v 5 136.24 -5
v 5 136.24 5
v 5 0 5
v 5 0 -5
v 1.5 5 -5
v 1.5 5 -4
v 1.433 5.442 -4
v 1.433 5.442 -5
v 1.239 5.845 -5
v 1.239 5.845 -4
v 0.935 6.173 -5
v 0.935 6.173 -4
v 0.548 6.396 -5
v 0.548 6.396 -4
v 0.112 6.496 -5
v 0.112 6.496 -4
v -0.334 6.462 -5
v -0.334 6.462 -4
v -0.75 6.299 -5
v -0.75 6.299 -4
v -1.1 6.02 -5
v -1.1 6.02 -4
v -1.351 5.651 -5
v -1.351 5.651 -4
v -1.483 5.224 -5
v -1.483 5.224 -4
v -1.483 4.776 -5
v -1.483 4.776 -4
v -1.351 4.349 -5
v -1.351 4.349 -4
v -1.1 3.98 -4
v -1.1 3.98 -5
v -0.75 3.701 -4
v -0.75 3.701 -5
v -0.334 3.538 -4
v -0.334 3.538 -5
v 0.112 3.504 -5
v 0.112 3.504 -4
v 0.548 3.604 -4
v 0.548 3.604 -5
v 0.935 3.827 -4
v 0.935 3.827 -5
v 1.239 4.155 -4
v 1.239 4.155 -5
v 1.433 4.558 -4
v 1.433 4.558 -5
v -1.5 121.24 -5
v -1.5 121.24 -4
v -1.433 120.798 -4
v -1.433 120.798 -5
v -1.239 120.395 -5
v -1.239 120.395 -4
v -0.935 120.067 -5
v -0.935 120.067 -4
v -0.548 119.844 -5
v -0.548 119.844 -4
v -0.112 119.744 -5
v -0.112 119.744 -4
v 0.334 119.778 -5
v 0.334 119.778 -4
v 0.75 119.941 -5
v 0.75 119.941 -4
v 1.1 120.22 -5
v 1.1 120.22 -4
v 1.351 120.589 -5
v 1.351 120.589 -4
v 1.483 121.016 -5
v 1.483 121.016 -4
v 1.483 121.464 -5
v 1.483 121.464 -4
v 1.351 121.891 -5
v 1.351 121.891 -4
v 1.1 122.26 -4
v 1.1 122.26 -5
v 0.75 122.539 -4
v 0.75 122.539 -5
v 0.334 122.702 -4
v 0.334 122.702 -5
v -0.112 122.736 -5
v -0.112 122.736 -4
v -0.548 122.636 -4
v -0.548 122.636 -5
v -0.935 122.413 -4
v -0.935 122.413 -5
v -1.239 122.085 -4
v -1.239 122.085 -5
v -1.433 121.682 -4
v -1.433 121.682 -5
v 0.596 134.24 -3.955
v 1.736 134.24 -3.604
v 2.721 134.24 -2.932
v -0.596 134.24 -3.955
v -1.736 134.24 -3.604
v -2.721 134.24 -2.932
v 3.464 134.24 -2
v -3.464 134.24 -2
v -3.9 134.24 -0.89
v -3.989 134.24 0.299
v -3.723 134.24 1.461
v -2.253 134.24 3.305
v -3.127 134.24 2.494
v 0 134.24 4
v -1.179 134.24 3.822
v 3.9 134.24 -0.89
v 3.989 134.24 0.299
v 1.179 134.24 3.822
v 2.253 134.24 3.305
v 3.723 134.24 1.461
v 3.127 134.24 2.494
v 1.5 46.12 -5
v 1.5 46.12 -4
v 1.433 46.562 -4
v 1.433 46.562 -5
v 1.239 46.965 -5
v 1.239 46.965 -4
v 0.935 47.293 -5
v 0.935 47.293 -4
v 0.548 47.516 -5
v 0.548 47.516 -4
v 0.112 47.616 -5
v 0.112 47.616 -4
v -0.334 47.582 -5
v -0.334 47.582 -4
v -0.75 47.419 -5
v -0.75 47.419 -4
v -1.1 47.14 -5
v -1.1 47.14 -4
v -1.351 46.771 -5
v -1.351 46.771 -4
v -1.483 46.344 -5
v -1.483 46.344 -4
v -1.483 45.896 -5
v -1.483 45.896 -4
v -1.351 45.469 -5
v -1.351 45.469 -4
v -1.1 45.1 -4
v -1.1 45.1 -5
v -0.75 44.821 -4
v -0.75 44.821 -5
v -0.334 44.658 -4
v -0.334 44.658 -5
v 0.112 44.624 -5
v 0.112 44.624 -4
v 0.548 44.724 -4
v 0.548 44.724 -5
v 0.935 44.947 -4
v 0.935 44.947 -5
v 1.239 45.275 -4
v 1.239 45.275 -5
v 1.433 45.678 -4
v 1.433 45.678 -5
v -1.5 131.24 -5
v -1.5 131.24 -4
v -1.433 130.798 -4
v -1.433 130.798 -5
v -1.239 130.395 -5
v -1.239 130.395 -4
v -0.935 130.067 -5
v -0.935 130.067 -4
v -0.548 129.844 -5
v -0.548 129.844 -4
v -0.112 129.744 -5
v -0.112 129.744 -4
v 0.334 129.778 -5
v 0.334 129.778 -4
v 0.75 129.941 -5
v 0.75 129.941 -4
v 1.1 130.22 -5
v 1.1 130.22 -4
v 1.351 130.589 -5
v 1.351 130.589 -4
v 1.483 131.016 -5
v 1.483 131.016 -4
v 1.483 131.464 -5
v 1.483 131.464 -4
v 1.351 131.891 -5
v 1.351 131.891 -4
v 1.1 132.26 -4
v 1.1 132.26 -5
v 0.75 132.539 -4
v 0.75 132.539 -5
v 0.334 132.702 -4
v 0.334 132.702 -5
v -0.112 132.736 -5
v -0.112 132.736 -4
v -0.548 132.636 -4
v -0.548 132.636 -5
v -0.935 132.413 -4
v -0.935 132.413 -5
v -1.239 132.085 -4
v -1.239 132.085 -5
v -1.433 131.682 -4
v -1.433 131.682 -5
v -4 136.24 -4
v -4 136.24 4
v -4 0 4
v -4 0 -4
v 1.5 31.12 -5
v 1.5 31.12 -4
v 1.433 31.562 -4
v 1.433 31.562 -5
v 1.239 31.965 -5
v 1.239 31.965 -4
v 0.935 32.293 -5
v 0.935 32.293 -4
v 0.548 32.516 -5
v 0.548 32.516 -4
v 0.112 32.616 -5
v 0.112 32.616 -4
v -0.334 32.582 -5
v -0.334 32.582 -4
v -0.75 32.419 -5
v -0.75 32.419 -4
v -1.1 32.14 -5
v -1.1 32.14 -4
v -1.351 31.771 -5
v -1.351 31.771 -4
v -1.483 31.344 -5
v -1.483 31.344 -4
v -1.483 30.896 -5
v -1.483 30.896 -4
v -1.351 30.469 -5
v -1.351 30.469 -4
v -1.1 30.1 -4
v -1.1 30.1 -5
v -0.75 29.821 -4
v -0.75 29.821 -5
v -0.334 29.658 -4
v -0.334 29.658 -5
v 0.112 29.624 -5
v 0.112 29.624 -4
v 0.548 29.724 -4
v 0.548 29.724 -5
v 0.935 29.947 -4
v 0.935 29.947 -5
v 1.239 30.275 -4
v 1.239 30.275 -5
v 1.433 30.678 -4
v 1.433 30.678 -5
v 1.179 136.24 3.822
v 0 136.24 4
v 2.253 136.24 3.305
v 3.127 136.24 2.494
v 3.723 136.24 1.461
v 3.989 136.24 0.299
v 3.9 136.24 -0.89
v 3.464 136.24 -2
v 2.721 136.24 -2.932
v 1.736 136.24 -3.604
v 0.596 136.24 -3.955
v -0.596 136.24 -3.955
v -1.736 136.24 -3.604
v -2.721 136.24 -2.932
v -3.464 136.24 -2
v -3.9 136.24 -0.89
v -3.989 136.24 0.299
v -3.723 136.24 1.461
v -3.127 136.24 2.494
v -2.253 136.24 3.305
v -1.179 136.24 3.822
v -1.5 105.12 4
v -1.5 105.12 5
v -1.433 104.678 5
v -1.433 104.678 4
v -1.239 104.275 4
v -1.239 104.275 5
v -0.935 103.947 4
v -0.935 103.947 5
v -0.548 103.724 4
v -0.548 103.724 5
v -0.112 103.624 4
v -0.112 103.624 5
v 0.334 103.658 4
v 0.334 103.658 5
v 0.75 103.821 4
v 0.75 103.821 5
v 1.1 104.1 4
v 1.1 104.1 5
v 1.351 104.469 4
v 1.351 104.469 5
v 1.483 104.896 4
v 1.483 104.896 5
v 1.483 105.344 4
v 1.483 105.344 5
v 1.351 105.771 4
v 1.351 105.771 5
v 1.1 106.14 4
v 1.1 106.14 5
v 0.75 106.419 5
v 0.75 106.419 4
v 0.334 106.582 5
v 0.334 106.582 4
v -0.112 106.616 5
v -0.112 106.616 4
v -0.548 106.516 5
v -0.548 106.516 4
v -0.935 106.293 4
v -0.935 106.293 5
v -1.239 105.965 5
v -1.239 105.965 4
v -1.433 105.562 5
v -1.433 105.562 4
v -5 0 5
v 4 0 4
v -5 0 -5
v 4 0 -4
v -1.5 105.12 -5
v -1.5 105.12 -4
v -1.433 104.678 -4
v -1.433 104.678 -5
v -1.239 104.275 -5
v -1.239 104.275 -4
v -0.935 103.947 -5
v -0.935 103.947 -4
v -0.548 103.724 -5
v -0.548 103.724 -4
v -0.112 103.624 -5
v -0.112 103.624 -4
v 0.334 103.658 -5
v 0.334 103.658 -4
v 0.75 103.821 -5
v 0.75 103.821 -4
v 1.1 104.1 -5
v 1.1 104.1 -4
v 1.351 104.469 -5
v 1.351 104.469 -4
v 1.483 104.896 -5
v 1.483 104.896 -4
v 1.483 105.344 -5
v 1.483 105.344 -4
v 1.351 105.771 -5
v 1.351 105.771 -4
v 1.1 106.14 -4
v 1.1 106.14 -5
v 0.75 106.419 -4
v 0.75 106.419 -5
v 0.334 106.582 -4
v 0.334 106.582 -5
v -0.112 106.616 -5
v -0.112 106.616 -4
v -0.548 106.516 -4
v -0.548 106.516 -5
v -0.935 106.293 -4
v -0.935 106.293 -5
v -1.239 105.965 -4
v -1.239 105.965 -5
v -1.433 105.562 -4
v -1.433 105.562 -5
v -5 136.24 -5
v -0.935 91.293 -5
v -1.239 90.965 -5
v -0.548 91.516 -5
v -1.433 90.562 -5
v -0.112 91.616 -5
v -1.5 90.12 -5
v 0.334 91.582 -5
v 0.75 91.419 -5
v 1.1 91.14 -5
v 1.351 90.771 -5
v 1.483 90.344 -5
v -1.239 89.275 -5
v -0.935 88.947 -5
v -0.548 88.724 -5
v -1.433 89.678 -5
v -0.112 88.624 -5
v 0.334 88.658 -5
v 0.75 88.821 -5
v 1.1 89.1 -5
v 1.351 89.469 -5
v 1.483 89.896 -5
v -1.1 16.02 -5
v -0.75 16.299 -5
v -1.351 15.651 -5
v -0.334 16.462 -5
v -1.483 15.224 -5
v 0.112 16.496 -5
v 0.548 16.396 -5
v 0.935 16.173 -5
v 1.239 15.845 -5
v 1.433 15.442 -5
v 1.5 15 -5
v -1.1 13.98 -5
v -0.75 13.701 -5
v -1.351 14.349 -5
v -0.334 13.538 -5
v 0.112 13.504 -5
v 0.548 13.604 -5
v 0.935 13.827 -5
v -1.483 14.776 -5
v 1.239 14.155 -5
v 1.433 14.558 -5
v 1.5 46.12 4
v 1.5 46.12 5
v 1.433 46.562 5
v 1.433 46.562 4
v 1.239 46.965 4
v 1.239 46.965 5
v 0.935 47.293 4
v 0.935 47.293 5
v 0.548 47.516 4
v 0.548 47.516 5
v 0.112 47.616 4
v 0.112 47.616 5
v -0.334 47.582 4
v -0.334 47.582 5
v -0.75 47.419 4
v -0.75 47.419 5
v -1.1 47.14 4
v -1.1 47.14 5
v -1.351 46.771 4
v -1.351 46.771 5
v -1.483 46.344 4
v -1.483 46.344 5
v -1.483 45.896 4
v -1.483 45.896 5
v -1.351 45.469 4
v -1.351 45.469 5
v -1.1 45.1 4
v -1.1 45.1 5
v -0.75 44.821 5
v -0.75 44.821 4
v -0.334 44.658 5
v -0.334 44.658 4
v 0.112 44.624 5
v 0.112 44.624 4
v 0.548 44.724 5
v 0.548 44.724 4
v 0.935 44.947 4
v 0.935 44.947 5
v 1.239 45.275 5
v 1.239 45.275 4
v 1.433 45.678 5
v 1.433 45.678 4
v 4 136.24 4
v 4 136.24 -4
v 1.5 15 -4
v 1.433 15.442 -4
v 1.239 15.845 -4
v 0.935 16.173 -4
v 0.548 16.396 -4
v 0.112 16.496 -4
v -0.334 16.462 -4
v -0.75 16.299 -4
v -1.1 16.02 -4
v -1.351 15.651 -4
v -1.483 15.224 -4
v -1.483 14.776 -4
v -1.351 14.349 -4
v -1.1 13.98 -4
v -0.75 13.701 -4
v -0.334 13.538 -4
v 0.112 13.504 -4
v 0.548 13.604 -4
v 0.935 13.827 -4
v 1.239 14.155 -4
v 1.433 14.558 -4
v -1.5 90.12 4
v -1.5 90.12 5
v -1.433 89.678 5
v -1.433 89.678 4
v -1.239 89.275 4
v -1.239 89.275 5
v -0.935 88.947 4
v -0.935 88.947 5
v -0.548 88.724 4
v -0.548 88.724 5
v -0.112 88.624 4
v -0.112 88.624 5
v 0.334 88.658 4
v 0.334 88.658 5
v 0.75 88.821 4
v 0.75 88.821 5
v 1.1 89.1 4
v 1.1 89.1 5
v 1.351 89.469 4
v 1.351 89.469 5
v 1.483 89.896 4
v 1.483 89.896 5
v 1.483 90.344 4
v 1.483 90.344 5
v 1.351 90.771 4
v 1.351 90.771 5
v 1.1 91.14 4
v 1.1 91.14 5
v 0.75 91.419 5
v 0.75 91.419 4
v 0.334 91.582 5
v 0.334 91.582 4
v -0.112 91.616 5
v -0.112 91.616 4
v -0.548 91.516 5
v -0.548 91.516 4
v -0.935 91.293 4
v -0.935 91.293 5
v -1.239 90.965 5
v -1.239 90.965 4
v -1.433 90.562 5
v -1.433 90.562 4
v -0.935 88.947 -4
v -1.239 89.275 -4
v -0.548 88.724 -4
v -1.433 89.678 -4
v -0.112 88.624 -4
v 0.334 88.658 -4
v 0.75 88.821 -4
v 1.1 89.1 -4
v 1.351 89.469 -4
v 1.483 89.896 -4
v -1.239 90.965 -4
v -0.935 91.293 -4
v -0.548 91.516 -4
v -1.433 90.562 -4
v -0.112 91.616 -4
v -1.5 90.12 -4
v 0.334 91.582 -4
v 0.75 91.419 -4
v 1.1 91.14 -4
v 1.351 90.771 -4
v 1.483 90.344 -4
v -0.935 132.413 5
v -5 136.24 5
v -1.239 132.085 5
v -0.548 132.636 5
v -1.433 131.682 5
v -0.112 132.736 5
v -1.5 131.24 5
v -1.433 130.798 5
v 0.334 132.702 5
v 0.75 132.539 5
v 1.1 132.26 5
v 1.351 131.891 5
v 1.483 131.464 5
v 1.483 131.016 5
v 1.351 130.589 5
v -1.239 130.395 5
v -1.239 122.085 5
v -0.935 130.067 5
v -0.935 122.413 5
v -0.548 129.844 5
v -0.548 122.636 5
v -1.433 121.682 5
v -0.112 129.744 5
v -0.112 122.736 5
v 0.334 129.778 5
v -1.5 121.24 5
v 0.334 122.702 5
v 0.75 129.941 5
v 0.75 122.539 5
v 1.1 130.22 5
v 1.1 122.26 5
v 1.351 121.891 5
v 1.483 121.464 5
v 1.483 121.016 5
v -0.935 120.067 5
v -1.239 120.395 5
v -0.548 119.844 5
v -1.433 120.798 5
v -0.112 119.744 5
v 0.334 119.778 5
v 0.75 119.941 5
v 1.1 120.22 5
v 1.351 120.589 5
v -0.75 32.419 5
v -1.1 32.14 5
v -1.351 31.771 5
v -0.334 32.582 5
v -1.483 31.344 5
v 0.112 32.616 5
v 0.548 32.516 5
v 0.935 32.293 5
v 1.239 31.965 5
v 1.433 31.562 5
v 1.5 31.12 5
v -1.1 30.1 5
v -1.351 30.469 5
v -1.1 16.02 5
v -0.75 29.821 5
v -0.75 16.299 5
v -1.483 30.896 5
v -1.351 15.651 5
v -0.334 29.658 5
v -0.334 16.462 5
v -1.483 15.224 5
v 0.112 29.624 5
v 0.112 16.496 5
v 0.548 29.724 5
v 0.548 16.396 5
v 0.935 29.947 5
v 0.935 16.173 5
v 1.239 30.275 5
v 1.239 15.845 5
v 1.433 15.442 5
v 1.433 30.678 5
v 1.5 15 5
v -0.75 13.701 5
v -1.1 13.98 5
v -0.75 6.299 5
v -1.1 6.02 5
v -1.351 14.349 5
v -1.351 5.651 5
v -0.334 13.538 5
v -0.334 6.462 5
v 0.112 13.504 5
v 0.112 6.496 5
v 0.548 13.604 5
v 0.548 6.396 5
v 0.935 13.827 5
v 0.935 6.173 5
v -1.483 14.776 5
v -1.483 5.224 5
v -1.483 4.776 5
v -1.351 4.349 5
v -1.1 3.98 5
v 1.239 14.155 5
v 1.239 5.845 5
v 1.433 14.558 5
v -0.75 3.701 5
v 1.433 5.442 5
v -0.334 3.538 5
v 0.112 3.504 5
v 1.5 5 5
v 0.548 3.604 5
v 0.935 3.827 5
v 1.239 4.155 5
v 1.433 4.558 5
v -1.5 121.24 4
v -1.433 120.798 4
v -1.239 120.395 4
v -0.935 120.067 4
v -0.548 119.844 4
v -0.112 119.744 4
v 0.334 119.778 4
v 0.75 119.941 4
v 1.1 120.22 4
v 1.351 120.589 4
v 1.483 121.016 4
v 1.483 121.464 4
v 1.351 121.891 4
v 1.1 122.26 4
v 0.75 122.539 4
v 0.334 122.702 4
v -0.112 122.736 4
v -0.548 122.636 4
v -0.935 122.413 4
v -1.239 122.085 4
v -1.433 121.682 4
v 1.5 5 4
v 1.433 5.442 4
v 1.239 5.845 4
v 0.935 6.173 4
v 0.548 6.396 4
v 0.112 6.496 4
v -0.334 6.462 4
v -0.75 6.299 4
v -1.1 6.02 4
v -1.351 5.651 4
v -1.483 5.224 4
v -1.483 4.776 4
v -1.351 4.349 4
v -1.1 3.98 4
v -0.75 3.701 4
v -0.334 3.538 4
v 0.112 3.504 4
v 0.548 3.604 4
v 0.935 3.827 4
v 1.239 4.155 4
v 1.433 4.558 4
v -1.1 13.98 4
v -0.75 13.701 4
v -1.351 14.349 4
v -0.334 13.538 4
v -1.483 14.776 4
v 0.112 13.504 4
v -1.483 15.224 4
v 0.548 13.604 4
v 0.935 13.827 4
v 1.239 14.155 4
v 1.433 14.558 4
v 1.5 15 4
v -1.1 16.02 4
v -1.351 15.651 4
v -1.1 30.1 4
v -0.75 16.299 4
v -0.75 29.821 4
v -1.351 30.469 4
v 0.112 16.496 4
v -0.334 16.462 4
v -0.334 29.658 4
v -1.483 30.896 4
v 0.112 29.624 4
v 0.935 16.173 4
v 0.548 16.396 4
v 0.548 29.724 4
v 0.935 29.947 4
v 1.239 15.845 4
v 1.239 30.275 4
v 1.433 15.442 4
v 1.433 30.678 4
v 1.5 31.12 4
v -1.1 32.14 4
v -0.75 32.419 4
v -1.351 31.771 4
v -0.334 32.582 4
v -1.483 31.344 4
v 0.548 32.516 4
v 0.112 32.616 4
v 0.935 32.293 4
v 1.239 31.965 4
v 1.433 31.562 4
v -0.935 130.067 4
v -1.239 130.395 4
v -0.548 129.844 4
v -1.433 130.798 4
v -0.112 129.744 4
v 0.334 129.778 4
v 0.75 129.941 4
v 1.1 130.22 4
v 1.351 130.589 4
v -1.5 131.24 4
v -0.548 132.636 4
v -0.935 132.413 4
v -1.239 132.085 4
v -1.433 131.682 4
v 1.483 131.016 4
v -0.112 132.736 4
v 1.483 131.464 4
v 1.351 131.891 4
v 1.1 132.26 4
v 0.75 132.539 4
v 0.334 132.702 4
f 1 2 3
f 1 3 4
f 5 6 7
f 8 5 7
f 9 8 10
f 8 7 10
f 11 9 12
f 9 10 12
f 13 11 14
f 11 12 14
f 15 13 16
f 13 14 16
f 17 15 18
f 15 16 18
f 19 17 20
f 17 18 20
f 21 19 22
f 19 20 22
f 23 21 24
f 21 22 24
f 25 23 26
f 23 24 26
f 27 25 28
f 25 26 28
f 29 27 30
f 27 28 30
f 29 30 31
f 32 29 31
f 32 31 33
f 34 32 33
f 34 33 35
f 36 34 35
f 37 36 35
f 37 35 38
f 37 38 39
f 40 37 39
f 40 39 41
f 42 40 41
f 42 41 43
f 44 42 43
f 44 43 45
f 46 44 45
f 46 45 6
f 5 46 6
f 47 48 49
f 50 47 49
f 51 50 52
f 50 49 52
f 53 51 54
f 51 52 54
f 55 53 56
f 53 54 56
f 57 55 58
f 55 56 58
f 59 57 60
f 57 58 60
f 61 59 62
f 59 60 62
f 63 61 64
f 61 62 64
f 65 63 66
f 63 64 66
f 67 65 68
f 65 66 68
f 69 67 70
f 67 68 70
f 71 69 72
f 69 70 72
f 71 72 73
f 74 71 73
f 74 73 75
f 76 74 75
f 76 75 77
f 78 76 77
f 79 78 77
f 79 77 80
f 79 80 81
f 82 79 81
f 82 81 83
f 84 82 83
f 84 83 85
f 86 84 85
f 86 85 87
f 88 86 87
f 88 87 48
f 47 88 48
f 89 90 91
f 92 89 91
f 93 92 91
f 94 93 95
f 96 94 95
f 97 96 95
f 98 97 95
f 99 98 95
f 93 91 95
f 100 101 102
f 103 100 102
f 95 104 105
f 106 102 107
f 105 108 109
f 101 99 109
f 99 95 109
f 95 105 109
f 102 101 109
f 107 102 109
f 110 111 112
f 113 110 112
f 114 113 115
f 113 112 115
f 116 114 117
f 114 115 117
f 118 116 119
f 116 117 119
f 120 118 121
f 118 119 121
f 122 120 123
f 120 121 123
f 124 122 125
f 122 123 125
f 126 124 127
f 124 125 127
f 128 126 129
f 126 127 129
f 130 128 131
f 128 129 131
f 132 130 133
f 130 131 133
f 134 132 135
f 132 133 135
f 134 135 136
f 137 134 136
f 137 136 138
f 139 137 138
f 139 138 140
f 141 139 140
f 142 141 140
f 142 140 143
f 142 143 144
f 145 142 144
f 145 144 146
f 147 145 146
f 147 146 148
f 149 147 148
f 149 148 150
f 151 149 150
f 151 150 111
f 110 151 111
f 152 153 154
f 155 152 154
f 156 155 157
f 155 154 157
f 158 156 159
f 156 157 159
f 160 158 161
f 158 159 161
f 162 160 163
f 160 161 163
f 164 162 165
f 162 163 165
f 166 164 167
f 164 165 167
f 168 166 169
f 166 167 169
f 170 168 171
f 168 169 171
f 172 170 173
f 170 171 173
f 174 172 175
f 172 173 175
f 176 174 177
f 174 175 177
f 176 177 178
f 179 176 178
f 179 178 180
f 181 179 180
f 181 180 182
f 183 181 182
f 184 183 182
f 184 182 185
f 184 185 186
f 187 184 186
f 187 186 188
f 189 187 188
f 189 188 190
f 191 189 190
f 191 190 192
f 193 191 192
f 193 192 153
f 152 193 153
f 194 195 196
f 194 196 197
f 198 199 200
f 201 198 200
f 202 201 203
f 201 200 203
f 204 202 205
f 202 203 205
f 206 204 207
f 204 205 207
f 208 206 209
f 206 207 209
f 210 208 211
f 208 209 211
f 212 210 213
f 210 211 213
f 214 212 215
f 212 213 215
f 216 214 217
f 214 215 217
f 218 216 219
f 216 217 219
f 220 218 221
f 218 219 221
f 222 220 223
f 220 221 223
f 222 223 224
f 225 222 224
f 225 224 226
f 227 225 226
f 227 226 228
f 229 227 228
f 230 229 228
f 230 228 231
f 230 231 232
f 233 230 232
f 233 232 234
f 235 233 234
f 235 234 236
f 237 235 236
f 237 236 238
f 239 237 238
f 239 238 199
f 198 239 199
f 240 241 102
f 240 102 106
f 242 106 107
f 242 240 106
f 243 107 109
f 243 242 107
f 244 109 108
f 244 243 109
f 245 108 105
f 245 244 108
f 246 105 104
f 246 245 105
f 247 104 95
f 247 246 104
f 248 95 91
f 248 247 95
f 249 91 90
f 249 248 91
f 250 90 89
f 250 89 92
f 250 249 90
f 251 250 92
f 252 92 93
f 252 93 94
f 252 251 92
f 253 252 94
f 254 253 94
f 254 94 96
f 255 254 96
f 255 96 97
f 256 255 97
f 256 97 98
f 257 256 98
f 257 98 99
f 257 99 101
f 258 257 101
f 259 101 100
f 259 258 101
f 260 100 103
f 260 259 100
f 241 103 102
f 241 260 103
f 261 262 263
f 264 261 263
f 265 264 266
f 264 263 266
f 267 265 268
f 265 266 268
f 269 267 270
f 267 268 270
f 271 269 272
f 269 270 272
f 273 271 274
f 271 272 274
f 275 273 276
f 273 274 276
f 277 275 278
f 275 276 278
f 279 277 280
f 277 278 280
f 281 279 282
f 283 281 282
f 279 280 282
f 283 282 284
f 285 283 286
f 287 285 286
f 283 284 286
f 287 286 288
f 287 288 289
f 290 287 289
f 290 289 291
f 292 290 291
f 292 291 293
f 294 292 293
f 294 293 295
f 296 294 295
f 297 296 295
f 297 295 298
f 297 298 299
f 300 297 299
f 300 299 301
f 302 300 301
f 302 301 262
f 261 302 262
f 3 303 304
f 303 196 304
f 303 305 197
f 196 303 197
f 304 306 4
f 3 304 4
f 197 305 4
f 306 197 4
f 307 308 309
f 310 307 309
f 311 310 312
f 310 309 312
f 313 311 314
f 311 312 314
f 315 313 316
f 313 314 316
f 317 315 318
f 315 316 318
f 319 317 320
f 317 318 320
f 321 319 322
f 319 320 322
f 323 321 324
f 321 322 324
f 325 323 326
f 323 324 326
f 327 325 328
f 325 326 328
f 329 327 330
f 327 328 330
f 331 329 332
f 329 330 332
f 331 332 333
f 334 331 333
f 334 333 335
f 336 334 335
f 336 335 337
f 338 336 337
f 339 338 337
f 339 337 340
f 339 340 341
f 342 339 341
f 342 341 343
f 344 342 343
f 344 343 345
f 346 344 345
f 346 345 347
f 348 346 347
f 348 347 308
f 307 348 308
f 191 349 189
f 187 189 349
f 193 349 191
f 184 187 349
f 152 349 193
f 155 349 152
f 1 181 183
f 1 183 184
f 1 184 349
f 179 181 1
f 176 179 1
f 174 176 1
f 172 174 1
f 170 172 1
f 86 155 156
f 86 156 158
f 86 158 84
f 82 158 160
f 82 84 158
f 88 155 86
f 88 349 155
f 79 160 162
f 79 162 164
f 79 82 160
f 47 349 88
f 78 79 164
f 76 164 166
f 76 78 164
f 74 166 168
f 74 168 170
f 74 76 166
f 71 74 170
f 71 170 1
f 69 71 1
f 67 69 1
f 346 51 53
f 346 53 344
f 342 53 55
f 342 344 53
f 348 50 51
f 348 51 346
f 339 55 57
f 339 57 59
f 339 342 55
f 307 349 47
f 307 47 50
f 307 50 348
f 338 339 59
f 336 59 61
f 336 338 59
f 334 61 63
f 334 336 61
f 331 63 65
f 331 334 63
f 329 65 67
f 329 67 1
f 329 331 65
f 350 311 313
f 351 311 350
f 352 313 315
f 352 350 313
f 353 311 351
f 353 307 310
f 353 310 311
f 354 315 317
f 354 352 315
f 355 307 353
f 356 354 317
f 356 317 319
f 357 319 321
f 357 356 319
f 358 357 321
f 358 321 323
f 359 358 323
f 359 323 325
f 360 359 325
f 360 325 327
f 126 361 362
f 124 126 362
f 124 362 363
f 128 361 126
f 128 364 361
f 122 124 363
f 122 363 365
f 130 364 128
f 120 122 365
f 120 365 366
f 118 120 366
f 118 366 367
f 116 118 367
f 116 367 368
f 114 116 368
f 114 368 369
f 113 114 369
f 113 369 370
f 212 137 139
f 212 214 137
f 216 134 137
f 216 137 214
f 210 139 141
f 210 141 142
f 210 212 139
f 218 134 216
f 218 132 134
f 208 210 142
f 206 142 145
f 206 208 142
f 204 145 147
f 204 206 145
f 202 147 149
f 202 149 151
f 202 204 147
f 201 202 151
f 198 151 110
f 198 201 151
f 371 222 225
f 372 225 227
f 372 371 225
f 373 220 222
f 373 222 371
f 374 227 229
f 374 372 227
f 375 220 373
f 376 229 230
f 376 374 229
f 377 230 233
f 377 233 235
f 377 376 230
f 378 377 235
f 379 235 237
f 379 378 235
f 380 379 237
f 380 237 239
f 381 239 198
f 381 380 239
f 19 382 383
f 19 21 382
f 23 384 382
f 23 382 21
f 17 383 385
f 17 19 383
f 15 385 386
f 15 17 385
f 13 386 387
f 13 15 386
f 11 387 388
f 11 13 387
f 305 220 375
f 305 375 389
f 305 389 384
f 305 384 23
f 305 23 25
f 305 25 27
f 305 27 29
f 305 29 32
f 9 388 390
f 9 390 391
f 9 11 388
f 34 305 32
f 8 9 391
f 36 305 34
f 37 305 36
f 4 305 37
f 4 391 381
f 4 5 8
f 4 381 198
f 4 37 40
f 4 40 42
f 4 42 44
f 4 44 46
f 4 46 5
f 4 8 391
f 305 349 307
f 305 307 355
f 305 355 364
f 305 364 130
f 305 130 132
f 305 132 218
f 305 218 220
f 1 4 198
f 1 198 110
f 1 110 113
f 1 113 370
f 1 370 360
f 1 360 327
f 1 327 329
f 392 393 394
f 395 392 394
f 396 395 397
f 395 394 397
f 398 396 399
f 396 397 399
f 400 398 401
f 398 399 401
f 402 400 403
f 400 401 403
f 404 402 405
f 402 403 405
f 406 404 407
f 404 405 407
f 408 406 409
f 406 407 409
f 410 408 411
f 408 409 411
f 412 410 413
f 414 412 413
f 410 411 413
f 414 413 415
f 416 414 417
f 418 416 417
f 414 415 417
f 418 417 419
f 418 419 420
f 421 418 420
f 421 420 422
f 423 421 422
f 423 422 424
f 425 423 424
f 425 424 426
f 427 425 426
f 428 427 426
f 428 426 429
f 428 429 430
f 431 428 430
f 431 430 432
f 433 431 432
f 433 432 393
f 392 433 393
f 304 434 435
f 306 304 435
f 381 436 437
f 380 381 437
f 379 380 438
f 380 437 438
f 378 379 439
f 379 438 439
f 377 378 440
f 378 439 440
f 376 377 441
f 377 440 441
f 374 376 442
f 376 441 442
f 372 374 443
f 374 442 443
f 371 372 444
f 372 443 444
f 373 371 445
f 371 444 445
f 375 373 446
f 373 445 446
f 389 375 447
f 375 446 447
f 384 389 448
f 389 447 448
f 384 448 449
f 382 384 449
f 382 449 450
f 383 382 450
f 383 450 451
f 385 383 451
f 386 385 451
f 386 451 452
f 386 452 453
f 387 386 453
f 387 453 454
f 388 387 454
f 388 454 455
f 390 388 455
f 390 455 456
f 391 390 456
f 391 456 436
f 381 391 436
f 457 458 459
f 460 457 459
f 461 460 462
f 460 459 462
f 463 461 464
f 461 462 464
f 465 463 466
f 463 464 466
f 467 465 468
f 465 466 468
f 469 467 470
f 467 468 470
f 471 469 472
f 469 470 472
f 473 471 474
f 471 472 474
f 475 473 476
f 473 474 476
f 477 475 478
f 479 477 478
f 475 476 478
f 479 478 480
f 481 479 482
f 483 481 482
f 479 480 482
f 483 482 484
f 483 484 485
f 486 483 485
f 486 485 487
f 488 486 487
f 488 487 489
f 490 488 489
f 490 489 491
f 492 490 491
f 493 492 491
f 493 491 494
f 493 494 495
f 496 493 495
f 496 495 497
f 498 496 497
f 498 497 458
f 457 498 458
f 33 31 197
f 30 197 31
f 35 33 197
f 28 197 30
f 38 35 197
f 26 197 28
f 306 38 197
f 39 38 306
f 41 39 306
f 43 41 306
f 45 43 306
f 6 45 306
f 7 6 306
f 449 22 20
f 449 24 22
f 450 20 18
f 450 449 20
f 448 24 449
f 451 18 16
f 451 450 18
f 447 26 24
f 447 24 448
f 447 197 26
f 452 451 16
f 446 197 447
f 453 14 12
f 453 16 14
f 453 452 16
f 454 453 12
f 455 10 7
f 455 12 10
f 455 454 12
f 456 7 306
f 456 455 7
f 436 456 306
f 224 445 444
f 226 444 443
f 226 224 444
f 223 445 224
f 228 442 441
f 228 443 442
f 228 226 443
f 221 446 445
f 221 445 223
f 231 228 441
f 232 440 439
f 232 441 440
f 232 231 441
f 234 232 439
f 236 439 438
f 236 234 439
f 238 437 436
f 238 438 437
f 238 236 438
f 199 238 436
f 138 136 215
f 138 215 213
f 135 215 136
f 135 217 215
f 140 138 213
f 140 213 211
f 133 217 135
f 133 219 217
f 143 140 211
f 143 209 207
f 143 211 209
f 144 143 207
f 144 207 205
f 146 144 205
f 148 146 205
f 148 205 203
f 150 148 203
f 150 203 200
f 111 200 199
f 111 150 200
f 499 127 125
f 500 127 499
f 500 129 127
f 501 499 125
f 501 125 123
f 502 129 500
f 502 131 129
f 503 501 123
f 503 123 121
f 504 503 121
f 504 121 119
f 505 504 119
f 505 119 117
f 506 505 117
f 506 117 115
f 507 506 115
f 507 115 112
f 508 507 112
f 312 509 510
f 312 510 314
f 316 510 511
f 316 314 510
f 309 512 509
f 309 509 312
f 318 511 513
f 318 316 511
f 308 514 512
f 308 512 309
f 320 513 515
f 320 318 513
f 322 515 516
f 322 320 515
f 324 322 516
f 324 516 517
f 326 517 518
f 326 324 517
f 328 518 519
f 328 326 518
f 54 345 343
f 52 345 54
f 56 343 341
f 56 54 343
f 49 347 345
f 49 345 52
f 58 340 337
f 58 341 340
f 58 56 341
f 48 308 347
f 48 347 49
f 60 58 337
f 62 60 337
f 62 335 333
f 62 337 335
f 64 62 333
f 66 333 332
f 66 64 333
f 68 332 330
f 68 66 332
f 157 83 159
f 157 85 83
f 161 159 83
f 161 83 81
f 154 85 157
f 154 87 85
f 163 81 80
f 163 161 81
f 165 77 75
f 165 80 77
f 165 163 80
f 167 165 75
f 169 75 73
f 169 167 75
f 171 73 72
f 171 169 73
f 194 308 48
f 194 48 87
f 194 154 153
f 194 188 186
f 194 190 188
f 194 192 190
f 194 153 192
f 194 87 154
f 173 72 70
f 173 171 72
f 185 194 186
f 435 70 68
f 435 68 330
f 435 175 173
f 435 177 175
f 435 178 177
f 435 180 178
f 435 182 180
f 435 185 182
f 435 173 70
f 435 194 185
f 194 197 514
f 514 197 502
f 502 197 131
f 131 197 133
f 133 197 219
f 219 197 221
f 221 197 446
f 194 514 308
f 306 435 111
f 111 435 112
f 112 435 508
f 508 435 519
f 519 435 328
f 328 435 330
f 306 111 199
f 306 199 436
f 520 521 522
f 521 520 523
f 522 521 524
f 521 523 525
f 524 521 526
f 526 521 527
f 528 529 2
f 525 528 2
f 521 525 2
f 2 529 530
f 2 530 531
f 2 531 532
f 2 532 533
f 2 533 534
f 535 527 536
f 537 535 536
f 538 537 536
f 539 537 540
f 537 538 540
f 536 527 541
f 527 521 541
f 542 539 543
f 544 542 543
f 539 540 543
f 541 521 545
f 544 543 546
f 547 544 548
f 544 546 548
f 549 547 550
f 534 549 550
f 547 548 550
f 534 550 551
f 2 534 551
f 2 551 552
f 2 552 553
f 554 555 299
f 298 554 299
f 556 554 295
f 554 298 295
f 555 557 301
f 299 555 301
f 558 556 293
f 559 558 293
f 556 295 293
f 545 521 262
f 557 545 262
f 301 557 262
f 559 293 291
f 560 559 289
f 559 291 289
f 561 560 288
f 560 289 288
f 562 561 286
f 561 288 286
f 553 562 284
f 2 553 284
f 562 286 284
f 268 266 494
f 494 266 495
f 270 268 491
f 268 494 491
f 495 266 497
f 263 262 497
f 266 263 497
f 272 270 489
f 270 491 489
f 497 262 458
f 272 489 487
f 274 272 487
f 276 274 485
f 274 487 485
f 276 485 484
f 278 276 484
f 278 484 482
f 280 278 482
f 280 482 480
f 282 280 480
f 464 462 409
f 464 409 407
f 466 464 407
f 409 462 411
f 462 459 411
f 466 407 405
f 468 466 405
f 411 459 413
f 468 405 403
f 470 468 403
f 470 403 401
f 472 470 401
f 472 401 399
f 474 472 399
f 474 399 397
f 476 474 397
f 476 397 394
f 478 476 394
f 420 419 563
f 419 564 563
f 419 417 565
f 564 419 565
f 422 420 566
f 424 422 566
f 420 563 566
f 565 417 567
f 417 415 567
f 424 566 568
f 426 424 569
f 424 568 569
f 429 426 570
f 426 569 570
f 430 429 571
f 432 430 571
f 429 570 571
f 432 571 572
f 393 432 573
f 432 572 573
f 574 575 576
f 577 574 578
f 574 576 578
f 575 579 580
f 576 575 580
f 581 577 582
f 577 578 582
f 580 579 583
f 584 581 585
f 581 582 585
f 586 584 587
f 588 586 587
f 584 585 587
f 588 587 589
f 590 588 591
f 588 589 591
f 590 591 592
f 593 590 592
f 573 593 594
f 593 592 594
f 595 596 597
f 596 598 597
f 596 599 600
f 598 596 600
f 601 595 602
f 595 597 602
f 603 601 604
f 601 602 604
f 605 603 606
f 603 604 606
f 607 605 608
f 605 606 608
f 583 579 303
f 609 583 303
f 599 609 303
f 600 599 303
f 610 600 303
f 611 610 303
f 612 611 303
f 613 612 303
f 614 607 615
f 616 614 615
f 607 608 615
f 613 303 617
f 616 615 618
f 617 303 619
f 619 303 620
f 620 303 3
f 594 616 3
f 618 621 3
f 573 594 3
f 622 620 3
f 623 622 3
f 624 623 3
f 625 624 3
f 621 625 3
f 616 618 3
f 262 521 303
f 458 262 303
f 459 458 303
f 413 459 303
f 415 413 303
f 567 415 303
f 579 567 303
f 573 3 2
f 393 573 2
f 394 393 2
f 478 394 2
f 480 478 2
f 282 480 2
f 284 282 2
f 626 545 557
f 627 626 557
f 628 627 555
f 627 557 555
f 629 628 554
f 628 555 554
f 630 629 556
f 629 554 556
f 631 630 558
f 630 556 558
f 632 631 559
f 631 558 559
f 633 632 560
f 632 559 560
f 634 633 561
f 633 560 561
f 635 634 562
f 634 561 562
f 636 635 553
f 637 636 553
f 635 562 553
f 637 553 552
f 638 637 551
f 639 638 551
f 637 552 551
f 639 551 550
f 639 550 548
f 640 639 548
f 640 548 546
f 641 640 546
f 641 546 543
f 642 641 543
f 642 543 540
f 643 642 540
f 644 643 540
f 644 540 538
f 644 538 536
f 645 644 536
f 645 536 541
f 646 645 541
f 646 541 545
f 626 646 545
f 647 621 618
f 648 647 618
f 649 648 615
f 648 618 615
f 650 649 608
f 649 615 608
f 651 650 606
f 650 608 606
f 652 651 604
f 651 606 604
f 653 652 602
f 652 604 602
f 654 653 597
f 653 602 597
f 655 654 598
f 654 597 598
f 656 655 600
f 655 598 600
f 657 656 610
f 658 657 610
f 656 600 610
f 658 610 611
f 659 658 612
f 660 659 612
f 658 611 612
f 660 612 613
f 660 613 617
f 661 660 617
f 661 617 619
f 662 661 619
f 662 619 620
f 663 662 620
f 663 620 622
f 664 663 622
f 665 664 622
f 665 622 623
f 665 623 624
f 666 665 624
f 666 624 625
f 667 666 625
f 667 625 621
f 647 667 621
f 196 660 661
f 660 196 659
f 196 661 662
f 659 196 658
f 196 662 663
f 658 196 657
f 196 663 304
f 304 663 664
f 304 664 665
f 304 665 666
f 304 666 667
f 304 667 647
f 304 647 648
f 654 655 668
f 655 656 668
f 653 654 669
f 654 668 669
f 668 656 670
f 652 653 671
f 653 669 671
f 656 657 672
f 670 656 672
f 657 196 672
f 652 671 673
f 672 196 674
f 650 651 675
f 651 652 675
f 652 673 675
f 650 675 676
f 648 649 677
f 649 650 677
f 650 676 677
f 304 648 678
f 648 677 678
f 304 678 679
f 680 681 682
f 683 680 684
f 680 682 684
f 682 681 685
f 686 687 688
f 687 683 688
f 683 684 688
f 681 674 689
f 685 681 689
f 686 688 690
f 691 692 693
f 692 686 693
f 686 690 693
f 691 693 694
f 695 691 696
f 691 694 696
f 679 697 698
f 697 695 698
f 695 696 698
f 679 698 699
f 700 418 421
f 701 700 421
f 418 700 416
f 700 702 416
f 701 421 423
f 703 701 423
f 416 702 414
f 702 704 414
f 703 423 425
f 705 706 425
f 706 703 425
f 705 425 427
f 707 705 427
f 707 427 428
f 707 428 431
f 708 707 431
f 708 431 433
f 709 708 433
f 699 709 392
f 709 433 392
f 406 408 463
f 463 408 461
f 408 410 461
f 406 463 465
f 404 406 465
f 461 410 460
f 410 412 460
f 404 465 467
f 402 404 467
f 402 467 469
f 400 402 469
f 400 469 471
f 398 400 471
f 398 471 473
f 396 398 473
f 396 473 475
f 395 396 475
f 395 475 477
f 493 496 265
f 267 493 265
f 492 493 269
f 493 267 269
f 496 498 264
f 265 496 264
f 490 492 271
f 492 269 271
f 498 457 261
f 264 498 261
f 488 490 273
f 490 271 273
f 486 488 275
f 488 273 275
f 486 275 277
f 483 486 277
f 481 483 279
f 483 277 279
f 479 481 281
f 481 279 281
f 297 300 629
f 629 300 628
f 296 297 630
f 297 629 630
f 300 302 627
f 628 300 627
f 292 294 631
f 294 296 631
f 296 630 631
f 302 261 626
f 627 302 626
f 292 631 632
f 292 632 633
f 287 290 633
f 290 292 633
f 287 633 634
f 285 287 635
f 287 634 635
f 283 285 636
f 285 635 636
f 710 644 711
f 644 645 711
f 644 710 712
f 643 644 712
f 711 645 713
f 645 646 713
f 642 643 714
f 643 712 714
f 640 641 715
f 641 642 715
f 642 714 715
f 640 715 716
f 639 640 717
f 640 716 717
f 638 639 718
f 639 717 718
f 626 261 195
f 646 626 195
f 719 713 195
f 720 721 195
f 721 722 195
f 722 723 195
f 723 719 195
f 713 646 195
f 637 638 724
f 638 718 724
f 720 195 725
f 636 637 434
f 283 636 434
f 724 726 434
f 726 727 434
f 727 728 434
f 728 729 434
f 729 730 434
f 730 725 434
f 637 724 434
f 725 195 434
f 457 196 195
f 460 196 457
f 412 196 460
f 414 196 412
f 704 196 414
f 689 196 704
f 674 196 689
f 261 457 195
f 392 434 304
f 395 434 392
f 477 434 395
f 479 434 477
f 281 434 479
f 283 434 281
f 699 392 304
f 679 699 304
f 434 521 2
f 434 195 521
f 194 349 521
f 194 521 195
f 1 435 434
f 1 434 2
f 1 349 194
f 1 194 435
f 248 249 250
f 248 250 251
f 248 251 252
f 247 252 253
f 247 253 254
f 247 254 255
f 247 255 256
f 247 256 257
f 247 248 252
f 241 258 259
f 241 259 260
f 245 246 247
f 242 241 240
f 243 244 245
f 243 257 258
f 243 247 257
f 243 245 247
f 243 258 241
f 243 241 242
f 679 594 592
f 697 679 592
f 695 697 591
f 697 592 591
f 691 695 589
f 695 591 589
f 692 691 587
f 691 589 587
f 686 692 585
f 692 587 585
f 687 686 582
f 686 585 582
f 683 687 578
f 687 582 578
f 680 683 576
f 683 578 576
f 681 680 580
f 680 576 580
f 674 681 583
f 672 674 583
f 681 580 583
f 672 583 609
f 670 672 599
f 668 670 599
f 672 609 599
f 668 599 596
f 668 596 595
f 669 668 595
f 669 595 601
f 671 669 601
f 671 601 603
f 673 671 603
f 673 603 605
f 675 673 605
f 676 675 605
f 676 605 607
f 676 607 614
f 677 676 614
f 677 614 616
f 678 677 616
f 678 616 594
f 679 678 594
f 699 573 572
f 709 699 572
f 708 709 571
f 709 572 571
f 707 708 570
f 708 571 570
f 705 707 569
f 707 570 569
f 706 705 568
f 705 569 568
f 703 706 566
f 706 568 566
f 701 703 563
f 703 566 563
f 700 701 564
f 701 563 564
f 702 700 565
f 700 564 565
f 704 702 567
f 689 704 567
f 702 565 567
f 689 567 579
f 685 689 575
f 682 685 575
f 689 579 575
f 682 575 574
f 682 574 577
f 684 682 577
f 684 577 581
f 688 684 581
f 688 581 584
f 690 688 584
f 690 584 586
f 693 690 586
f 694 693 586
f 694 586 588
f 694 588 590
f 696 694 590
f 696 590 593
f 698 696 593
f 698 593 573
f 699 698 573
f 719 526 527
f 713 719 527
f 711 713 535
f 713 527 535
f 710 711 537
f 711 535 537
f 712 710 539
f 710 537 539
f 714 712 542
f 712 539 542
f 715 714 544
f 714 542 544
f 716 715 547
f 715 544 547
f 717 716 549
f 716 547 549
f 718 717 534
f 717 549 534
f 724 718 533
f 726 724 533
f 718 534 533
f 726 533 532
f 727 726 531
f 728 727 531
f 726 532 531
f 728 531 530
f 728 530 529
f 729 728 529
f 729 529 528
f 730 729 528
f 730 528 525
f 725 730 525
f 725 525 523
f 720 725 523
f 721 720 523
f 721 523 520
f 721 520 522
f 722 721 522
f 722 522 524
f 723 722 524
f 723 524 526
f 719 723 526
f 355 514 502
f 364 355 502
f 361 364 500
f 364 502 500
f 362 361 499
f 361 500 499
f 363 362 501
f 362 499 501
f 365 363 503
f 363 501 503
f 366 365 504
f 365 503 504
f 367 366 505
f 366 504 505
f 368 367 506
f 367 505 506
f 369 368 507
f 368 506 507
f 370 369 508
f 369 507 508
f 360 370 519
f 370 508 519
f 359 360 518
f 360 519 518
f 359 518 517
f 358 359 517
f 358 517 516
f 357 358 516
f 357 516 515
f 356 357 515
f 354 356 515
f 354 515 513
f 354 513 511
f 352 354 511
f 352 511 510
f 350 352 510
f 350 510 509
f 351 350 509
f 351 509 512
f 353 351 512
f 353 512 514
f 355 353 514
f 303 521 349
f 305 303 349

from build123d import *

# Parameters (mm, degrees)
SKETCH_1_W          = 10
SKETCH_1_H          = 10
EXTRUDE_1_DEPTH     = 136.24
SKETCH_2_R          = 1.5
CUT_EXTRUDE_1_DEPTH = 137.697979502
SKETCH_3_W          = 8
SKETCH_3_H          = 8
CUT_EXTRUDE_2_DEPTH = 137.423376296
SKETCH_4_R          = 4
EXTRUDE_1251_DEPTH  = 2


with BuildPart() as part:
    # 草图1 → 凸台-拉伸1 (new body)
    with BuildSketch(Plane(origin=(0, 0, 0), x_dir=(1, 0, 0), z_dir=(0, 1, 0))):
        Rectangle(SKETCH_1_W, SKETCH_1_H)
    extrude(amount=EXTRUDE_1_DEPTH)

    # 草图2 → 切除-拉伸1 (cut, through all)
    with BuildSketch(Plane.XY.offset(5)):
        with Locations((0, 5)):
            Circle(SKETCH_2_R)
        with Locations((0, 15)):
            Circle(SKETCH_2_R)
        with Locations((0, 121.24)):
            Circle(SKETCH_2_R)
        with Locations((0, 131.24)):
            Circle(SKETCH_2_R)
        with Locations((0, 46.12)):
            Circle(SKETCH_2_R)
        with Locations((0, 90.12)):
            Circle(SKETCH_2_R)
        with Locations((0, 31.12)):
            Circle(SKETCH_2_R)
        with Locations((0, 105.12)):
            Circle(SKETCH_2_R)
    extrude(amount=-CUT_EXTRUDE_1_DEPTH, mode=Mode.SUBTRACT)

    # 草图3 → 切除-拉伸2 (cut, through all)
    with BuildSketch(Plane(origin=(0, 136.24, 0), x_dir=(1, 0, 0), z_dir=(0, 1, 0))):
        Rectangle(SKETCH_3_W, SKETCH_3_H)
    extrude(amount=-CUT_EXTRUDE_2_DEPTH, mode=Mode.SUBTRACT)


with BuildPart() as body_2:
    # 草图4 → Extrude 1251 (new body)
    with BuildSketch(Plane(origin=(0, 136.24, 0), x_dir=(1, 0, 0), z_dir=(0, 1, 0))):
        Circle(SKETCH_4_R)
    extrude(amount=-EXTRUDE_1251_DEPTH)


solid = Compound([part.part, body_2.part])
